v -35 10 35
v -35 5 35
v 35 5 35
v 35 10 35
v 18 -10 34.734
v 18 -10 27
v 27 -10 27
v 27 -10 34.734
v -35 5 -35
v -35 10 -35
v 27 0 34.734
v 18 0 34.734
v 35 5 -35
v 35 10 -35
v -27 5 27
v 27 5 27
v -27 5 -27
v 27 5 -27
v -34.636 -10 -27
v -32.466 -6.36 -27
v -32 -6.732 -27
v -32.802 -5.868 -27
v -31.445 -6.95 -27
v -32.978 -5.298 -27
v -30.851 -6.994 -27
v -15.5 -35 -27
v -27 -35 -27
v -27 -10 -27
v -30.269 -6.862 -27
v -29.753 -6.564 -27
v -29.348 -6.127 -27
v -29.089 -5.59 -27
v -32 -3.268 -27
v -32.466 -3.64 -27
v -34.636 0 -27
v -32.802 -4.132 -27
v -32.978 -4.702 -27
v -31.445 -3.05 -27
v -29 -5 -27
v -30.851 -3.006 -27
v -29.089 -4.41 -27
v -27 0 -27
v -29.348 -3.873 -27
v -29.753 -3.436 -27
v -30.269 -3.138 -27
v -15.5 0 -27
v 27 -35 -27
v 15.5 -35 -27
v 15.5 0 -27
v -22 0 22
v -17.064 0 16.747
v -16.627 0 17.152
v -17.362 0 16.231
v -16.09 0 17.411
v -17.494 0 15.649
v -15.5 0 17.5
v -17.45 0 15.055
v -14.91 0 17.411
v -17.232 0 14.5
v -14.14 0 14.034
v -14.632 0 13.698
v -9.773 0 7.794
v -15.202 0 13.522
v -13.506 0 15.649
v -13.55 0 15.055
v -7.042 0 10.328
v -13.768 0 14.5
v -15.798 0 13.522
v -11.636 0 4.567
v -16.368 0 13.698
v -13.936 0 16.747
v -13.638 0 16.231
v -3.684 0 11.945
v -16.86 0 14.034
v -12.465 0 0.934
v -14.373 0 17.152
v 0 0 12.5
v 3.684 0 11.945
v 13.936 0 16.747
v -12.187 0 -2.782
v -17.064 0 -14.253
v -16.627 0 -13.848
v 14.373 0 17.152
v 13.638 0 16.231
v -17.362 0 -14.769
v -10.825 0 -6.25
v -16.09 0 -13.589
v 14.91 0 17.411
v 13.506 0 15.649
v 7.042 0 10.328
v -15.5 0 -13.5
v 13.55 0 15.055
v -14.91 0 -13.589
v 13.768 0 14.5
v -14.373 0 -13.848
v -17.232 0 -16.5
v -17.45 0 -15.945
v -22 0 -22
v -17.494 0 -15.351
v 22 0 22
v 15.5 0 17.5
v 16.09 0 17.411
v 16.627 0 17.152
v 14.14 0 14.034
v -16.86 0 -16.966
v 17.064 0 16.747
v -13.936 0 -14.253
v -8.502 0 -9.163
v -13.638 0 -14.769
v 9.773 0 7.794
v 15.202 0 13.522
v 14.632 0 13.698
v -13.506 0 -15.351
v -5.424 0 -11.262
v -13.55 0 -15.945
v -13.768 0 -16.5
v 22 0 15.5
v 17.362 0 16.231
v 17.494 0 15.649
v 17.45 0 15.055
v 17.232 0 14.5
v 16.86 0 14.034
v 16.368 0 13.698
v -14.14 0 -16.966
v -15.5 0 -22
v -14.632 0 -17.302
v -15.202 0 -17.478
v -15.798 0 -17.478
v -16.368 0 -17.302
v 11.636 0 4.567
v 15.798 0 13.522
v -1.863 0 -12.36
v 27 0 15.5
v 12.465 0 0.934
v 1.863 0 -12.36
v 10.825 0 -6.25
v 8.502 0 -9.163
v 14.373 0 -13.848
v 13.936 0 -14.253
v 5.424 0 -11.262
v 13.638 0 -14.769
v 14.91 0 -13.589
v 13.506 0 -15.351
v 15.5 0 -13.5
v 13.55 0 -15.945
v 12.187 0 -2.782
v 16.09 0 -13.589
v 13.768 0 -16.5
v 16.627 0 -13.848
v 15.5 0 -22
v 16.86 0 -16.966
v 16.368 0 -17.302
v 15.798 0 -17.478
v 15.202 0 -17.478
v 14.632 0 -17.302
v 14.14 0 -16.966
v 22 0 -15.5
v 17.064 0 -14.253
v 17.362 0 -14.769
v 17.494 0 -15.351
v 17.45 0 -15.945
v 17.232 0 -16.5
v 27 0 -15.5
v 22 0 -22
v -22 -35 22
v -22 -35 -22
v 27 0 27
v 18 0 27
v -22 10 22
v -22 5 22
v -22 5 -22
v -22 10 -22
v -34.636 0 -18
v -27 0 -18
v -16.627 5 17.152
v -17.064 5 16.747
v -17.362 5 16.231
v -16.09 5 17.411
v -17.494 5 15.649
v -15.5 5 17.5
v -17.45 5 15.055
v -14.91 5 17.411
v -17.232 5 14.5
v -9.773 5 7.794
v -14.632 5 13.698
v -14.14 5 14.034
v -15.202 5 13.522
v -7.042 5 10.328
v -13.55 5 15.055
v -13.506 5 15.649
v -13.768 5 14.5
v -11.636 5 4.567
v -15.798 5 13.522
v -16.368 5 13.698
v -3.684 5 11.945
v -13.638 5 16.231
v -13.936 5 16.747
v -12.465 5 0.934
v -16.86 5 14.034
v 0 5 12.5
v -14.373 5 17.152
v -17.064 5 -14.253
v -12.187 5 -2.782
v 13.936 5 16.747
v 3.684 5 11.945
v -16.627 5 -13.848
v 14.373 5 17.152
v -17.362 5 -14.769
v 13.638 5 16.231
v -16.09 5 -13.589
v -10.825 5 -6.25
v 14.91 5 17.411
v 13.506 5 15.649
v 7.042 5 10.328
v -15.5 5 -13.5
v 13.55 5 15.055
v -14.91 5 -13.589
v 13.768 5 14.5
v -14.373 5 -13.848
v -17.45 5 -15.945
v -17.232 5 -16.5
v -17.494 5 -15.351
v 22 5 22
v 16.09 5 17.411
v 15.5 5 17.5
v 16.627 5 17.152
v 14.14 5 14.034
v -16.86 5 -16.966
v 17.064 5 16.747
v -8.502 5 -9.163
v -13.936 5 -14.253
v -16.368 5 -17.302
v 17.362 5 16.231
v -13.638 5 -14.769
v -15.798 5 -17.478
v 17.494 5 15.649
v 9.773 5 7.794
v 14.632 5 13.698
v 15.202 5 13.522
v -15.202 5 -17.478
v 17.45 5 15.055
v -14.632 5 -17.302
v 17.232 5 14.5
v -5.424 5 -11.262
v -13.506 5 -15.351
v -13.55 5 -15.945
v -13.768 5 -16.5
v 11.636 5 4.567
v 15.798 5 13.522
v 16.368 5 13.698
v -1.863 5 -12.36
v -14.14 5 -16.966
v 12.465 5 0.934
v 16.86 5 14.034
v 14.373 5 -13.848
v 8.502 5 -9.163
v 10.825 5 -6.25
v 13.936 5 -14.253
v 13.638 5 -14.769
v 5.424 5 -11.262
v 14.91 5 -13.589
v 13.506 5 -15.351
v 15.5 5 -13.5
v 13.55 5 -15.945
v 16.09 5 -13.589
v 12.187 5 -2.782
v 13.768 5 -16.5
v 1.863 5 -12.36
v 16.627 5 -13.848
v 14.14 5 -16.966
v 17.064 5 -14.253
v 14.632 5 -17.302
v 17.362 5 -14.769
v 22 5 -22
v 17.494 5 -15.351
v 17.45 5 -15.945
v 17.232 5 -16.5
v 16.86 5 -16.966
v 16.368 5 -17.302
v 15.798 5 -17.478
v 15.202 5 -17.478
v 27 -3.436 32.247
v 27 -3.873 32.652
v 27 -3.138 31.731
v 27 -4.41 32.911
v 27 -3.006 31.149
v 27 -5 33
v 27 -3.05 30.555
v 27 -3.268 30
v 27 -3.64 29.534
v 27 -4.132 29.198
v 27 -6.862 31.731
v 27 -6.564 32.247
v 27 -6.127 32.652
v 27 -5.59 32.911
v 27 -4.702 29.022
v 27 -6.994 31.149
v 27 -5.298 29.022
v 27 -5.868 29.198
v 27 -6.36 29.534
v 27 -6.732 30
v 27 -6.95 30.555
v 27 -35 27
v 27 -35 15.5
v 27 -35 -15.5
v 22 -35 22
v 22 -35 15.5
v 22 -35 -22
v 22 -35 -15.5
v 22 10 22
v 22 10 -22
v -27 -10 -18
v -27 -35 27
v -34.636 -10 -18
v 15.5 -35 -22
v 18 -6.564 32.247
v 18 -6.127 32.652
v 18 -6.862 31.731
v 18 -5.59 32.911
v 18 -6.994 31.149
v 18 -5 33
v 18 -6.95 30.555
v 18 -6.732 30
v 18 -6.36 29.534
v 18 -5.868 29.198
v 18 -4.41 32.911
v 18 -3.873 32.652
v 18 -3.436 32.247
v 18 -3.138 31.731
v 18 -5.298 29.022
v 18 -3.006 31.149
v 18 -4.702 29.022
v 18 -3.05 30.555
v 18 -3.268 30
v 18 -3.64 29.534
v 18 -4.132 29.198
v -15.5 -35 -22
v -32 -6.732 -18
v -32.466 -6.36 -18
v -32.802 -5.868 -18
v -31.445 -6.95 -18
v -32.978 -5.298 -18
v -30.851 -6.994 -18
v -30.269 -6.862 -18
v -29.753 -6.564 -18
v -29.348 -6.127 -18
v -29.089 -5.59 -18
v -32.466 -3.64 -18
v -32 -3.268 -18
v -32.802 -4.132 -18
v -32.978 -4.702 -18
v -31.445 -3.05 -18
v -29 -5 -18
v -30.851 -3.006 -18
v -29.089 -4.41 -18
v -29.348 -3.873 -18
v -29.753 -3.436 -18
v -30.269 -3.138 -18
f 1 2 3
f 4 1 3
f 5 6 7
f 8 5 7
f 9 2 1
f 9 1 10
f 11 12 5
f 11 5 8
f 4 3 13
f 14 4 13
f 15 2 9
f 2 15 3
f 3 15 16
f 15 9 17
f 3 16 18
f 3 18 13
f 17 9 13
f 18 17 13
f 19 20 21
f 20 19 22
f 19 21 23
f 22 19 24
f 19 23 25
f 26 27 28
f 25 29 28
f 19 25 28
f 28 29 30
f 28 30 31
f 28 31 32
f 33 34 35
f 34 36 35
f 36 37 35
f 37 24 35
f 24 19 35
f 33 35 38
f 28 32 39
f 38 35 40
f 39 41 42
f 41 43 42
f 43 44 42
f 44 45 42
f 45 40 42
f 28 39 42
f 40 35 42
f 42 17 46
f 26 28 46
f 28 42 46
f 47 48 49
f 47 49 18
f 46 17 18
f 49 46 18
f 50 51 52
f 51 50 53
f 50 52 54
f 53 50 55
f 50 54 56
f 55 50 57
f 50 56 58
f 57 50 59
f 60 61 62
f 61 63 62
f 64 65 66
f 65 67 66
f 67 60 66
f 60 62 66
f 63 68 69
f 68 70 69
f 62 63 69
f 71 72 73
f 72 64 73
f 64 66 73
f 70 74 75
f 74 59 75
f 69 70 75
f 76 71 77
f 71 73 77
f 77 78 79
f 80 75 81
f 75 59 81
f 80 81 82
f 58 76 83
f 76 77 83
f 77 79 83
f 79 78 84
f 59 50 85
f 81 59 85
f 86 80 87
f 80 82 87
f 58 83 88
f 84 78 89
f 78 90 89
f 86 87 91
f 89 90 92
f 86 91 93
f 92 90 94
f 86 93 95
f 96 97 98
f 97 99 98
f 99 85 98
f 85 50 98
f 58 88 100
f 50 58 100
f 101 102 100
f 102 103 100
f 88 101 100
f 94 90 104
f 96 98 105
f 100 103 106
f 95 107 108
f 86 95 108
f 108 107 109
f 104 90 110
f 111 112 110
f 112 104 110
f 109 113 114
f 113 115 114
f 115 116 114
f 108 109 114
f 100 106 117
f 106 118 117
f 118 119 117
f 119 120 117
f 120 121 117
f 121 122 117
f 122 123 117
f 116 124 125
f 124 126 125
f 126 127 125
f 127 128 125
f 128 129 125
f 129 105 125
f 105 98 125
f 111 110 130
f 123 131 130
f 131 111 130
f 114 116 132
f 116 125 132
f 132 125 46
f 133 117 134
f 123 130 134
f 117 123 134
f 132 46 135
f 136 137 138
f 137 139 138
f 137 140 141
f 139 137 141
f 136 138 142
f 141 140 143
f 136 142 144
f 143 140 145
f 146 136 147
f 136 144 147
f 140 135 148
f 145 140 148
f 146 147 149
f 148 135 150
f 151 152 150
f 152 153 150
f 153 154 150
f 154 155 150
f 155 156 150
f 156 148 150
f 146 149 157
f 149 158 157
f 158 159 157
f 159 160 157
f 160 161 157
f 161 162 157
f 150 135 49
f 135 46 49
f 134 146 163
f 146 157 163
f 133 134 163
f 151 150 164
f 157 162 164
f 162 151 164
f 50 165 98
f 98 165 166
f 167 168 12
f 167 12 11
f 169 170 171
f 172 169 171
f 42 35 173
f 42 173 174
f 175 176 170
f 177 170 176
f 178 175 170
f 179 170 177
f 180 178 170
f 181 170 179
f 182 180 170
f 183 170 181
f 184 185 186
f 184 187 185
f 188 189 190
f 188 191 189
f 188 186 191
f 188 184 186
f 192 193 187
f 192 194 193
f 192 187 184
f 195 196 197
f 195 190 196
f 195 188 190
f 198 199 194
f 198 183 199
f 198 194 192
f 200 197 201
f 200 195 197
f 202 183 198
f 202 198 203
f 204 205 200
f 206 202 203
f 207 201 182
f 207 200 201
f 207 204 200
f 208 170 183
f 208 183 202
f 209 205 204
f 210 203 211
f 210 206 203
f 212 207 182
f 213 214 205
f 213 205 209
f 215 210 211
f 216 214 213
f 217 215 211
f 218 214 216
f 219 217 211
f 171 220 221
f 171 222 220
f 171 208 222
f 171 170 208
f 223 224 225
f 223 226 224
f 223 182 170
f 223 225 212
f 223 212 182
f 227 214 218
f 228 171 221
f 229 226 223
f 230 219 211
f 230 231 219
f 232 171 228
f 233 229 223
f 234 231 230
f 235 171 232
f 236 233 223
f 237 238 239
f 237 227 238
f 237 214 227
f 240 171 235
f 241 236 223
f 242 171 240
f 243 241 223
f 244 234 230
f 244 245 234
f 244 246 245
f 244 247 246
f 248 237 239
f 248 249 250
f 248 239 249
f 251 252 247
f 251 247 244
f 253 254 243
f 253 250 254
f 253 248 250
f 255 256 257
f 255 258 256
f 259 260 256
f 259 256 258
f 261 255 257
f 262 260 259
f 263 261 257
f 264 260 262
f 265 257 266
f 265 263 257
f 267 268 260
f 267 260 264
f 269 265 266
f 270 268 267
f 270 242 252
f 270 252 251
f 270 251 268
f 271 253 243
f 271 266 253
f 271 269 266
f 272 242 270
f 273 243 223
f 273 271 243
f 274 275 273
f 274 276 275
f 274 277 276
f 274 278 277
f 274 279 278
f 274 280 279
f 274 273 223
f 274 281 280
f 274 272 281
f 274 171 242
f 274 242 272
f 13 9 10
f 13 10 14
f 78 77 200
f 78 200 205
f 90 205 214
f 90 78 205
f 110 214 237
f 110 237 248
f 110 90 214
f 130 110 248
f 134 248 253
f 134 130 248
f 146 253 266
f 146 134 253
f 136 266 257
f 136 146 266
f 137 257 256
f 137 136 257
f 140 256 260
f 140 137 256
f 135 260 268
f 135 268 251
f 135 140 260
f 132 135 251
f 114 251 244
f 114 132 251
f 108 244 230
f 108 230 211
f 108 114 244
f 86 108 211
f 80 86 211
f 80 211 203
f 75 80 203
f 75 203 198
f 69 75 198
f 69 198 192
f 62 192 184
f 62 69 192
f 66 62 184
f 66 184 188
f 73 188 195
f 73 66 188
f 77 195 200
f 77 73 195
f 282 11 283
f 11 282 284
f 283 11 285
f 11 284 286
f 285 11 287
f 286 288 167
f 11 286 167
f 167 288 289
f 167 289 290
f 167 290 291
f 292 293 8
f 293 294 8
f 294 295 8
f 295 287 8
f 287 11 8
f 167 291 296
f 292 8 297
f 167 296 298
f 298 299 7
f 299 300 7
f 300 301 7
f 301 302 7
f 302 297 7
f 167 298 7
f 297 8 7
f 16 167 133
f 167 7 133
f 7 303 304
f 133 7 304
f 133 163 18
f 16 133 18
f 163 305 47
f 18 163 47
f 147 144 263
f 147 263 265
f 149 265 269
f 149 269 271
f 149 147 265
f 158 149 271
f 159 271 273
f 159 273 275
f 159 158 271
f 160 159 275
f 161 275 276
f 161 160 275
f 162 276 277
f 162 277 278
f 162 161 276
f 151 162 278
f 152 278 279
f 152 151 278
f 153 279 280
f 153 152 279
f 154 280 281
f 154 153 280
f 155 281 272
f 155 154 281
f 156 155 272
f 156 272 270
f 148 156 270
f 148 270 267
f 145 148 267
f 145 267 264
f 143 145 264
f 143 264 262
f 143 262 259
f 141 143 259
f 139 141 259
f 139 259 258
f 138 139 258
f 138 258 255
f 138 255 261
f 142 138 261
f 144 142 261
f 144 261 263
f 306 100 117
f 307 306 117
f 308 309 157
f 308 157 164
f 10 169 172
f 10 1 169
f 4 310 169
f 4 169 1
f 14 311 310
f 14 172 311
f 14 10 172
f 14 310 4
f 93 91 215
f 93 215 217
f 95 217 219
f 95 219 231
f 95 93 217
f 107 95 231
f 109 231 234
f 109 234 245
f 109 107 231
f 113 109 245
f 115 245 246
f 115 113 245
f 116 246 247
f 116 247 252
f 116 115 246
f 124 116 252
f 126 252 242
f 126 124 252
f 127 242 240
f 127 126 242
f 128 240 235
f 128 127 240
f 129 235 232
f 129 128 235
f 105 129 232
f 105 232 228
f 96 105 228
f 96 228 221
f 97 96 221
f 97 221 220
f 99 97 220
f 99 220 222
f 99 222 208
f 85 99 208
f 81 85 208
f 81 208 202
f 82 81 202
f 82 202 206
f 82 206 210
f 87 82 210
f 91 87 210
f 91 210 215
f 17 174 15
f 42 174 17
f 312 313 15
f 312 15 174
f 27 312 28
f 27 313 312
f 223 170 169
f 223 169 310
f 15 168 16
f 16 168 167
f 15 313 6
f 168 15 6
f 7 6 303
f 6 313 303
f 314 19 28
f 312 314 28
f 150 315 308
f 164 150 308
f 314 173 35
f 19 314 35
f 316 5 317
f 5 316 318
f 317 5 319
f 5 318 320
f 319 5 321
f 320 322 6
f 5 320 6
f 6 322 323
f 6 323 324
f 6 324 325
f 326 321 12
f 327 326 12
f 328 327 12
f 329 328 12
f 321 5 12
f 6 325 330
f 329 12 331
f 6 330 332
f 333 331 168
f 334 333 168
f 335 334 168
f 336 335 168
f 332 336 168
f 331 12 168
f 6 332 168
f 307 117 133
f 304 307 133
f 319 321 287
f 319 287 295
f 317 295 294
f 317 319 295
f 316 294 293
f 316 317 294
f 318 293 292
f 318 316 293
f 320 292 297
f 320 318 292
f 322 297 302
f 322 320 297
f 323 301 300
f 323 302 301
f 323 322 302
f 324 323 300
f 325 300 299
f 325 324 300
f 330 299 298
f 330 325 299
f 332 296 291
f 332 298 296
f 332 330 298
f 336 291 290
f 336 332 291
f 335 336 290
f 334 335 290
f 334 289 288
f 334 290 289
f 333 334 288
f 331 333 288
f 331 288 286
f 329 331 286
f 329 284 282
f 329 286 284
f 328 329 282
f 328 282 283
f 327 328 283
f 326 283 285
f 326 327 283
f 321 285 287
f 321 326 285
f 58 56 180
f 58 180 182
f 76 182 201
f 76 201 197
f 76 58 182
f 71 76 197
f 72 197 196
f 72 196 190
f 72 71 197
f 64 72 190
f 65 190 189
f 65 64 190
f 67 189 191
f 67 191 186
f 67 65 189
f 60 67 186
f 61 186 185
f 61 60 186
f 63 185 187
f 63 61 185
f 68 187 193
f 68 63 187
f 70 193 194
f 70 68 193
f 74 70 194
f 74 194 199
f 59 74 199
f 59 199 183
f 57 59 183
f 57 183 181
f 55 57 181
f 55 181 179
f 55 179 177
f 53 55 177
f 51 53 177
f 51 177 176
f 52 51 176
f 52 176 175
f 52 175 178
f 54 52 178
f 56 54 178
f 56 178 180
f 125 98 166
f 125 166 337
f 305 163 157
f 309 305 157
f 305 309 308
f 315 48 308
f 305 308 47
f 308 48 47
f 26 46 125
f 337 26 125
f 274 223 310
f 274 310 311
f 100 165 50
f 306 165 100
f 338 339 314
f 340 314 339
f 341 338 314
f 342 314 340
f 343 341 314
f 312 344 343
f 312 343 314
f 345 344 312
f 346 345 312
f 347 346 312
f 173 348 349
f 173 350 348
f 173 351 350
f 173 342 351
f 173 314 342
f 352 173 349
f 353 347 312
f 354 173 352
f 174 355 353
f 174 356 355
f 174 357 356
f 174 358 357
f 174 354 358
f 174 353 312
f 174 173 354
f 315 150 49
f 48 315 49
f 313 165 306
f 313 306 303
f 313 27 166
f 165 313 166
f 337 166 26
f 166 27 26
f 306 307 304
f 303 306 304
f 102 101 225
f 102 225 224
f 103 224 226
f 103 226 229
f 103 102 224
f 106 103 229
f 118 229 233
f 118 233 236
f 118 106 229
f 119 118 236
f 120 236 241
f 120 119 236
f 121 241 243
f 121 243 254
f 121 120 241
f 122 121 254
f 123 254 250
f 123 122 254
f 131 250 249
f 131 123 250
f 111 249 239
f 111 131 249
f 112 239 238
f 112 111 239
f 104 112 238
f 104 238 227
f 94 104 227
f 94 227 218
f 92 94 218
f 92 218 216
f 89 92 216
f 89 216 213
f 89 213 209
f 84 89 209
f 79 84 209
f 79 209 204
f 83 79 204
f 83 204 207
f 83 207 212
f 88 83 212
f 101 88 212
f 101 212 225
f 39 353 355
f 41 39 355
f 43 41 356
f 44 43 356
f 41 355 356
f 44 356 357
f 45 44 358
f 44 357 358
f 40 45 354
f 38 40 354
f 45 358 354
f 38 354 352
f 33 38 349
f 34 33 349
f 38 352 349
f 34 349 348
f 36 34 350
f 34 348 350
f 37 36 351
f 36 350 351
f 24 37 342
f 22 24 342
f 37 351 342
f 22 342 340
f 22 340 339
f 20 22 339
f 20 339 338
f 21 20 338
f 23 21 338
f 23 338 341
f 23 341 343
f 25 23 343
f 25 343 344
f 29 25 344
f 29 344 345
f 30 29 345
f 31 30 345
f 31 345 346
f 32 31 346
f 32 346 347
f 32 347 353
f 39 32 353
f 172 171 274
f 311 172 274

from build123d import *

# Parameters (mm, degrees)
EXTRUDE_1_DEPTH          = 10
EXTRUDE_1_DEPTH_BACK     = 35
SKETCH_1_W               = 56
SKETCH_1_H               = 56
SKETCH_1_W_2             = 44
SKETCH_1_H_2             = 44
SKETCH_3_W               = 70
SKETCH_3_H               = 70
SKETCH_3_W_2             = 54
SKETCH_3_H_2             = 54
EXTRUDE_2_DEPTH          = 10
CUT_EXTRUDE_1_DEPTH      = 5
CUT_EXTRUDE_1_DEPTH_BACK = 40
SKETCH_3_2_W             = 70
SKETCH_3_2_H             = 70
SKETCH_3_2_W_2           = 54
SKETCH_3_2_H_2           = 54
SKETCH_4_W               = 47.606985224
SKETCH_4_H               = 48.466705047
SKETCH_4_R               = 12.5
SKETCH_4_R_2             = 2
EXTRUDE_3_DEPTH          = 5
CUT_EXTRUDE_2_DEPTH      = 50
SKETCH_6_W               = 12.5
SKETCH_6_H               = 9
SKETCH_6_W_2             = 9
SKETCH_6_H_2             = 12.5
EXTRUDE_4_DEPTH          = 10
SKETCH_7_R               = 2
CUT_EXTRUDE_3_DEPTH      = 1000
SKETCH_8_R               = 2
CUT_EXTRUDE_4_DEPTH      = 1000


with BuildPart() as part:
    # Эскиз1 → Бобышка-Вытянуть1 (new, two sides: drawn at the far end of the back side and taken through both)
    with BuildSketch(Plane(origin=(0, 0, 0), x_dir=(1, 0, 0), z_dir=(0, 1, 0)).offset(-EXTRUDE_1_DEPTH_BACK)):
        Rectangle(SKETCH_1_W, SKETCH_1_H)
        Rectangle(SKETCH_1_W_2, SKETCH_1_H_2, mode=Mode.SUBTRACT)
    extrude(amount=EXTRUDE_1_DEPTH + EXTRUDE_1_DEPTH_BACK)

    # Эскиз3 → Бобышка-Вытянуть2 (add)
    with BuildSketch(Plane(origin=(0, 0, 0), x_dir=(1, 0, 0), z_dir=(0, 1, 0))):
        Rectangle(SKETCH_3_W, SKETCH_3_H)
        Rectangle(SKETCH_3_W_2, SKETCH_3_H_2, mode=Mode.SUBTRACT)
    extrude(amount=EXTRUDE_2_DEPTH)

    # Эскиз3<2> → Вырез-Вытянуть1 (cut, two sides: drawn at the far end of the back side and taken through both)
    with BuildSketch(Plane(origin=(0, 0, 0), x_dir=(1, 0, 0), z_dir=(0, 1, 0)).offset(-CUT_EXTRUDE_1_DEPTH_BACK)):
        Rectangle(SKETCH_3_2_W, SKETCH_3_2_H)
        Rectangle(SKETCH_3_2_W_2, SKETCH_3_2_H_2, mode=Mode.SUBTRACT)
    extrude(amount=CUT_EXTRUDE_1_DEPTH + CUT_EXTRUDE_1_DEPTH_BACK, mode=Mode.SUBTRACT)

    # Эскиз4 → Бобышка-Вытянуть3 (add)
    with BuildSketch(Plane(origin=(0, 0, 0), x_dir=(1, 0, 0), z_dir=(0, 1, 0))):
        with Locations((0.268662445, 0.4835924)):
            Rectangle(SKETCH_4_W, SKETCH_4_H)
        Circle(SKETCH_4_R, mode=Mode.SUBTRACT)
        with Locations((-15.5, 15.5)):
            Circle(SKETCH_4_R_2, mode=Mode.SUBTRACT)
        with Locations((-15.5, -15.5)):
            Circle(SKETCH_4_R_2, mode=Mode.SUBTRACT)
        with Locations((15.5, -15.5)):
            Circle(SKETCH_4_R_2, mode=Mode.SUBTRACT)
        with Locations((15.5, 15.5)):
            Circle(SKETCH_4_R_2, mode=Mode.SUBTRACT)
    extrude(amount=EXTRUDE_3_DEPTH)

    # Эскиз5 → Вырез-Вытянуть2 (cut)
    with BuildSketch(Plane(origin=(0, 0, 0), x_dir=(1, 0, 0), z_dir=(0, 1, 0))):
        Polygon((-15.5, -15.5), (45.904177047, -15.5), (45.904177047, 15.5), (15.5, 15.5), (15.5, 51.810948834), (-15.5, 51.810948834), align=None)
    extrude(amount=-CUT_EXTRUDE_2_DEPTH, mode=Mode.SUBTRACT)

    # Эскиз6 → Бобышка-Вытянуть4 (add)
    with BuildSketch(Plane(origin=(0, 0, 0), x_dir=(1, 0, 0), z_dir=(0, 1, 0))):
        with Locations((-28.3864137, 22.5)):
            Rectangle(SKETCH_6_W, SKETCH_6_H)
        with Locations((22.5, -28.484371776)):
            Rectangle(SKETCH_6_W_2, SKETCH_6_H_2)
    extrude(amount=-EXTRUDE_4_DEPTH)

    # Эскиз7 → Вырез-Вытянуть3 (cut)
    with BuildSketch(Plane(origin=(0, 0, 0), x_dir=(0, 0, -1), z_dir=(1, 0, 0))):
        with Locations((-31, -5)):
            Circle(SKETCH_7_R)
    extrude(amount=CUT_EXTRUDE_3_DEPTH, mode=Mode.SUBTRACT)

    # Эскиз8 → Вырез-Вытянуть4 (cut)
    with BuildSketch(Plane.XY):
        with Locations((-31, -5)):
            Circle(SKETCH_8_R)
    extrude(amount=-CUT_EXTRUDE_4_DEPTH, mode=Mode.SUBTRACT)


solid = part.part
